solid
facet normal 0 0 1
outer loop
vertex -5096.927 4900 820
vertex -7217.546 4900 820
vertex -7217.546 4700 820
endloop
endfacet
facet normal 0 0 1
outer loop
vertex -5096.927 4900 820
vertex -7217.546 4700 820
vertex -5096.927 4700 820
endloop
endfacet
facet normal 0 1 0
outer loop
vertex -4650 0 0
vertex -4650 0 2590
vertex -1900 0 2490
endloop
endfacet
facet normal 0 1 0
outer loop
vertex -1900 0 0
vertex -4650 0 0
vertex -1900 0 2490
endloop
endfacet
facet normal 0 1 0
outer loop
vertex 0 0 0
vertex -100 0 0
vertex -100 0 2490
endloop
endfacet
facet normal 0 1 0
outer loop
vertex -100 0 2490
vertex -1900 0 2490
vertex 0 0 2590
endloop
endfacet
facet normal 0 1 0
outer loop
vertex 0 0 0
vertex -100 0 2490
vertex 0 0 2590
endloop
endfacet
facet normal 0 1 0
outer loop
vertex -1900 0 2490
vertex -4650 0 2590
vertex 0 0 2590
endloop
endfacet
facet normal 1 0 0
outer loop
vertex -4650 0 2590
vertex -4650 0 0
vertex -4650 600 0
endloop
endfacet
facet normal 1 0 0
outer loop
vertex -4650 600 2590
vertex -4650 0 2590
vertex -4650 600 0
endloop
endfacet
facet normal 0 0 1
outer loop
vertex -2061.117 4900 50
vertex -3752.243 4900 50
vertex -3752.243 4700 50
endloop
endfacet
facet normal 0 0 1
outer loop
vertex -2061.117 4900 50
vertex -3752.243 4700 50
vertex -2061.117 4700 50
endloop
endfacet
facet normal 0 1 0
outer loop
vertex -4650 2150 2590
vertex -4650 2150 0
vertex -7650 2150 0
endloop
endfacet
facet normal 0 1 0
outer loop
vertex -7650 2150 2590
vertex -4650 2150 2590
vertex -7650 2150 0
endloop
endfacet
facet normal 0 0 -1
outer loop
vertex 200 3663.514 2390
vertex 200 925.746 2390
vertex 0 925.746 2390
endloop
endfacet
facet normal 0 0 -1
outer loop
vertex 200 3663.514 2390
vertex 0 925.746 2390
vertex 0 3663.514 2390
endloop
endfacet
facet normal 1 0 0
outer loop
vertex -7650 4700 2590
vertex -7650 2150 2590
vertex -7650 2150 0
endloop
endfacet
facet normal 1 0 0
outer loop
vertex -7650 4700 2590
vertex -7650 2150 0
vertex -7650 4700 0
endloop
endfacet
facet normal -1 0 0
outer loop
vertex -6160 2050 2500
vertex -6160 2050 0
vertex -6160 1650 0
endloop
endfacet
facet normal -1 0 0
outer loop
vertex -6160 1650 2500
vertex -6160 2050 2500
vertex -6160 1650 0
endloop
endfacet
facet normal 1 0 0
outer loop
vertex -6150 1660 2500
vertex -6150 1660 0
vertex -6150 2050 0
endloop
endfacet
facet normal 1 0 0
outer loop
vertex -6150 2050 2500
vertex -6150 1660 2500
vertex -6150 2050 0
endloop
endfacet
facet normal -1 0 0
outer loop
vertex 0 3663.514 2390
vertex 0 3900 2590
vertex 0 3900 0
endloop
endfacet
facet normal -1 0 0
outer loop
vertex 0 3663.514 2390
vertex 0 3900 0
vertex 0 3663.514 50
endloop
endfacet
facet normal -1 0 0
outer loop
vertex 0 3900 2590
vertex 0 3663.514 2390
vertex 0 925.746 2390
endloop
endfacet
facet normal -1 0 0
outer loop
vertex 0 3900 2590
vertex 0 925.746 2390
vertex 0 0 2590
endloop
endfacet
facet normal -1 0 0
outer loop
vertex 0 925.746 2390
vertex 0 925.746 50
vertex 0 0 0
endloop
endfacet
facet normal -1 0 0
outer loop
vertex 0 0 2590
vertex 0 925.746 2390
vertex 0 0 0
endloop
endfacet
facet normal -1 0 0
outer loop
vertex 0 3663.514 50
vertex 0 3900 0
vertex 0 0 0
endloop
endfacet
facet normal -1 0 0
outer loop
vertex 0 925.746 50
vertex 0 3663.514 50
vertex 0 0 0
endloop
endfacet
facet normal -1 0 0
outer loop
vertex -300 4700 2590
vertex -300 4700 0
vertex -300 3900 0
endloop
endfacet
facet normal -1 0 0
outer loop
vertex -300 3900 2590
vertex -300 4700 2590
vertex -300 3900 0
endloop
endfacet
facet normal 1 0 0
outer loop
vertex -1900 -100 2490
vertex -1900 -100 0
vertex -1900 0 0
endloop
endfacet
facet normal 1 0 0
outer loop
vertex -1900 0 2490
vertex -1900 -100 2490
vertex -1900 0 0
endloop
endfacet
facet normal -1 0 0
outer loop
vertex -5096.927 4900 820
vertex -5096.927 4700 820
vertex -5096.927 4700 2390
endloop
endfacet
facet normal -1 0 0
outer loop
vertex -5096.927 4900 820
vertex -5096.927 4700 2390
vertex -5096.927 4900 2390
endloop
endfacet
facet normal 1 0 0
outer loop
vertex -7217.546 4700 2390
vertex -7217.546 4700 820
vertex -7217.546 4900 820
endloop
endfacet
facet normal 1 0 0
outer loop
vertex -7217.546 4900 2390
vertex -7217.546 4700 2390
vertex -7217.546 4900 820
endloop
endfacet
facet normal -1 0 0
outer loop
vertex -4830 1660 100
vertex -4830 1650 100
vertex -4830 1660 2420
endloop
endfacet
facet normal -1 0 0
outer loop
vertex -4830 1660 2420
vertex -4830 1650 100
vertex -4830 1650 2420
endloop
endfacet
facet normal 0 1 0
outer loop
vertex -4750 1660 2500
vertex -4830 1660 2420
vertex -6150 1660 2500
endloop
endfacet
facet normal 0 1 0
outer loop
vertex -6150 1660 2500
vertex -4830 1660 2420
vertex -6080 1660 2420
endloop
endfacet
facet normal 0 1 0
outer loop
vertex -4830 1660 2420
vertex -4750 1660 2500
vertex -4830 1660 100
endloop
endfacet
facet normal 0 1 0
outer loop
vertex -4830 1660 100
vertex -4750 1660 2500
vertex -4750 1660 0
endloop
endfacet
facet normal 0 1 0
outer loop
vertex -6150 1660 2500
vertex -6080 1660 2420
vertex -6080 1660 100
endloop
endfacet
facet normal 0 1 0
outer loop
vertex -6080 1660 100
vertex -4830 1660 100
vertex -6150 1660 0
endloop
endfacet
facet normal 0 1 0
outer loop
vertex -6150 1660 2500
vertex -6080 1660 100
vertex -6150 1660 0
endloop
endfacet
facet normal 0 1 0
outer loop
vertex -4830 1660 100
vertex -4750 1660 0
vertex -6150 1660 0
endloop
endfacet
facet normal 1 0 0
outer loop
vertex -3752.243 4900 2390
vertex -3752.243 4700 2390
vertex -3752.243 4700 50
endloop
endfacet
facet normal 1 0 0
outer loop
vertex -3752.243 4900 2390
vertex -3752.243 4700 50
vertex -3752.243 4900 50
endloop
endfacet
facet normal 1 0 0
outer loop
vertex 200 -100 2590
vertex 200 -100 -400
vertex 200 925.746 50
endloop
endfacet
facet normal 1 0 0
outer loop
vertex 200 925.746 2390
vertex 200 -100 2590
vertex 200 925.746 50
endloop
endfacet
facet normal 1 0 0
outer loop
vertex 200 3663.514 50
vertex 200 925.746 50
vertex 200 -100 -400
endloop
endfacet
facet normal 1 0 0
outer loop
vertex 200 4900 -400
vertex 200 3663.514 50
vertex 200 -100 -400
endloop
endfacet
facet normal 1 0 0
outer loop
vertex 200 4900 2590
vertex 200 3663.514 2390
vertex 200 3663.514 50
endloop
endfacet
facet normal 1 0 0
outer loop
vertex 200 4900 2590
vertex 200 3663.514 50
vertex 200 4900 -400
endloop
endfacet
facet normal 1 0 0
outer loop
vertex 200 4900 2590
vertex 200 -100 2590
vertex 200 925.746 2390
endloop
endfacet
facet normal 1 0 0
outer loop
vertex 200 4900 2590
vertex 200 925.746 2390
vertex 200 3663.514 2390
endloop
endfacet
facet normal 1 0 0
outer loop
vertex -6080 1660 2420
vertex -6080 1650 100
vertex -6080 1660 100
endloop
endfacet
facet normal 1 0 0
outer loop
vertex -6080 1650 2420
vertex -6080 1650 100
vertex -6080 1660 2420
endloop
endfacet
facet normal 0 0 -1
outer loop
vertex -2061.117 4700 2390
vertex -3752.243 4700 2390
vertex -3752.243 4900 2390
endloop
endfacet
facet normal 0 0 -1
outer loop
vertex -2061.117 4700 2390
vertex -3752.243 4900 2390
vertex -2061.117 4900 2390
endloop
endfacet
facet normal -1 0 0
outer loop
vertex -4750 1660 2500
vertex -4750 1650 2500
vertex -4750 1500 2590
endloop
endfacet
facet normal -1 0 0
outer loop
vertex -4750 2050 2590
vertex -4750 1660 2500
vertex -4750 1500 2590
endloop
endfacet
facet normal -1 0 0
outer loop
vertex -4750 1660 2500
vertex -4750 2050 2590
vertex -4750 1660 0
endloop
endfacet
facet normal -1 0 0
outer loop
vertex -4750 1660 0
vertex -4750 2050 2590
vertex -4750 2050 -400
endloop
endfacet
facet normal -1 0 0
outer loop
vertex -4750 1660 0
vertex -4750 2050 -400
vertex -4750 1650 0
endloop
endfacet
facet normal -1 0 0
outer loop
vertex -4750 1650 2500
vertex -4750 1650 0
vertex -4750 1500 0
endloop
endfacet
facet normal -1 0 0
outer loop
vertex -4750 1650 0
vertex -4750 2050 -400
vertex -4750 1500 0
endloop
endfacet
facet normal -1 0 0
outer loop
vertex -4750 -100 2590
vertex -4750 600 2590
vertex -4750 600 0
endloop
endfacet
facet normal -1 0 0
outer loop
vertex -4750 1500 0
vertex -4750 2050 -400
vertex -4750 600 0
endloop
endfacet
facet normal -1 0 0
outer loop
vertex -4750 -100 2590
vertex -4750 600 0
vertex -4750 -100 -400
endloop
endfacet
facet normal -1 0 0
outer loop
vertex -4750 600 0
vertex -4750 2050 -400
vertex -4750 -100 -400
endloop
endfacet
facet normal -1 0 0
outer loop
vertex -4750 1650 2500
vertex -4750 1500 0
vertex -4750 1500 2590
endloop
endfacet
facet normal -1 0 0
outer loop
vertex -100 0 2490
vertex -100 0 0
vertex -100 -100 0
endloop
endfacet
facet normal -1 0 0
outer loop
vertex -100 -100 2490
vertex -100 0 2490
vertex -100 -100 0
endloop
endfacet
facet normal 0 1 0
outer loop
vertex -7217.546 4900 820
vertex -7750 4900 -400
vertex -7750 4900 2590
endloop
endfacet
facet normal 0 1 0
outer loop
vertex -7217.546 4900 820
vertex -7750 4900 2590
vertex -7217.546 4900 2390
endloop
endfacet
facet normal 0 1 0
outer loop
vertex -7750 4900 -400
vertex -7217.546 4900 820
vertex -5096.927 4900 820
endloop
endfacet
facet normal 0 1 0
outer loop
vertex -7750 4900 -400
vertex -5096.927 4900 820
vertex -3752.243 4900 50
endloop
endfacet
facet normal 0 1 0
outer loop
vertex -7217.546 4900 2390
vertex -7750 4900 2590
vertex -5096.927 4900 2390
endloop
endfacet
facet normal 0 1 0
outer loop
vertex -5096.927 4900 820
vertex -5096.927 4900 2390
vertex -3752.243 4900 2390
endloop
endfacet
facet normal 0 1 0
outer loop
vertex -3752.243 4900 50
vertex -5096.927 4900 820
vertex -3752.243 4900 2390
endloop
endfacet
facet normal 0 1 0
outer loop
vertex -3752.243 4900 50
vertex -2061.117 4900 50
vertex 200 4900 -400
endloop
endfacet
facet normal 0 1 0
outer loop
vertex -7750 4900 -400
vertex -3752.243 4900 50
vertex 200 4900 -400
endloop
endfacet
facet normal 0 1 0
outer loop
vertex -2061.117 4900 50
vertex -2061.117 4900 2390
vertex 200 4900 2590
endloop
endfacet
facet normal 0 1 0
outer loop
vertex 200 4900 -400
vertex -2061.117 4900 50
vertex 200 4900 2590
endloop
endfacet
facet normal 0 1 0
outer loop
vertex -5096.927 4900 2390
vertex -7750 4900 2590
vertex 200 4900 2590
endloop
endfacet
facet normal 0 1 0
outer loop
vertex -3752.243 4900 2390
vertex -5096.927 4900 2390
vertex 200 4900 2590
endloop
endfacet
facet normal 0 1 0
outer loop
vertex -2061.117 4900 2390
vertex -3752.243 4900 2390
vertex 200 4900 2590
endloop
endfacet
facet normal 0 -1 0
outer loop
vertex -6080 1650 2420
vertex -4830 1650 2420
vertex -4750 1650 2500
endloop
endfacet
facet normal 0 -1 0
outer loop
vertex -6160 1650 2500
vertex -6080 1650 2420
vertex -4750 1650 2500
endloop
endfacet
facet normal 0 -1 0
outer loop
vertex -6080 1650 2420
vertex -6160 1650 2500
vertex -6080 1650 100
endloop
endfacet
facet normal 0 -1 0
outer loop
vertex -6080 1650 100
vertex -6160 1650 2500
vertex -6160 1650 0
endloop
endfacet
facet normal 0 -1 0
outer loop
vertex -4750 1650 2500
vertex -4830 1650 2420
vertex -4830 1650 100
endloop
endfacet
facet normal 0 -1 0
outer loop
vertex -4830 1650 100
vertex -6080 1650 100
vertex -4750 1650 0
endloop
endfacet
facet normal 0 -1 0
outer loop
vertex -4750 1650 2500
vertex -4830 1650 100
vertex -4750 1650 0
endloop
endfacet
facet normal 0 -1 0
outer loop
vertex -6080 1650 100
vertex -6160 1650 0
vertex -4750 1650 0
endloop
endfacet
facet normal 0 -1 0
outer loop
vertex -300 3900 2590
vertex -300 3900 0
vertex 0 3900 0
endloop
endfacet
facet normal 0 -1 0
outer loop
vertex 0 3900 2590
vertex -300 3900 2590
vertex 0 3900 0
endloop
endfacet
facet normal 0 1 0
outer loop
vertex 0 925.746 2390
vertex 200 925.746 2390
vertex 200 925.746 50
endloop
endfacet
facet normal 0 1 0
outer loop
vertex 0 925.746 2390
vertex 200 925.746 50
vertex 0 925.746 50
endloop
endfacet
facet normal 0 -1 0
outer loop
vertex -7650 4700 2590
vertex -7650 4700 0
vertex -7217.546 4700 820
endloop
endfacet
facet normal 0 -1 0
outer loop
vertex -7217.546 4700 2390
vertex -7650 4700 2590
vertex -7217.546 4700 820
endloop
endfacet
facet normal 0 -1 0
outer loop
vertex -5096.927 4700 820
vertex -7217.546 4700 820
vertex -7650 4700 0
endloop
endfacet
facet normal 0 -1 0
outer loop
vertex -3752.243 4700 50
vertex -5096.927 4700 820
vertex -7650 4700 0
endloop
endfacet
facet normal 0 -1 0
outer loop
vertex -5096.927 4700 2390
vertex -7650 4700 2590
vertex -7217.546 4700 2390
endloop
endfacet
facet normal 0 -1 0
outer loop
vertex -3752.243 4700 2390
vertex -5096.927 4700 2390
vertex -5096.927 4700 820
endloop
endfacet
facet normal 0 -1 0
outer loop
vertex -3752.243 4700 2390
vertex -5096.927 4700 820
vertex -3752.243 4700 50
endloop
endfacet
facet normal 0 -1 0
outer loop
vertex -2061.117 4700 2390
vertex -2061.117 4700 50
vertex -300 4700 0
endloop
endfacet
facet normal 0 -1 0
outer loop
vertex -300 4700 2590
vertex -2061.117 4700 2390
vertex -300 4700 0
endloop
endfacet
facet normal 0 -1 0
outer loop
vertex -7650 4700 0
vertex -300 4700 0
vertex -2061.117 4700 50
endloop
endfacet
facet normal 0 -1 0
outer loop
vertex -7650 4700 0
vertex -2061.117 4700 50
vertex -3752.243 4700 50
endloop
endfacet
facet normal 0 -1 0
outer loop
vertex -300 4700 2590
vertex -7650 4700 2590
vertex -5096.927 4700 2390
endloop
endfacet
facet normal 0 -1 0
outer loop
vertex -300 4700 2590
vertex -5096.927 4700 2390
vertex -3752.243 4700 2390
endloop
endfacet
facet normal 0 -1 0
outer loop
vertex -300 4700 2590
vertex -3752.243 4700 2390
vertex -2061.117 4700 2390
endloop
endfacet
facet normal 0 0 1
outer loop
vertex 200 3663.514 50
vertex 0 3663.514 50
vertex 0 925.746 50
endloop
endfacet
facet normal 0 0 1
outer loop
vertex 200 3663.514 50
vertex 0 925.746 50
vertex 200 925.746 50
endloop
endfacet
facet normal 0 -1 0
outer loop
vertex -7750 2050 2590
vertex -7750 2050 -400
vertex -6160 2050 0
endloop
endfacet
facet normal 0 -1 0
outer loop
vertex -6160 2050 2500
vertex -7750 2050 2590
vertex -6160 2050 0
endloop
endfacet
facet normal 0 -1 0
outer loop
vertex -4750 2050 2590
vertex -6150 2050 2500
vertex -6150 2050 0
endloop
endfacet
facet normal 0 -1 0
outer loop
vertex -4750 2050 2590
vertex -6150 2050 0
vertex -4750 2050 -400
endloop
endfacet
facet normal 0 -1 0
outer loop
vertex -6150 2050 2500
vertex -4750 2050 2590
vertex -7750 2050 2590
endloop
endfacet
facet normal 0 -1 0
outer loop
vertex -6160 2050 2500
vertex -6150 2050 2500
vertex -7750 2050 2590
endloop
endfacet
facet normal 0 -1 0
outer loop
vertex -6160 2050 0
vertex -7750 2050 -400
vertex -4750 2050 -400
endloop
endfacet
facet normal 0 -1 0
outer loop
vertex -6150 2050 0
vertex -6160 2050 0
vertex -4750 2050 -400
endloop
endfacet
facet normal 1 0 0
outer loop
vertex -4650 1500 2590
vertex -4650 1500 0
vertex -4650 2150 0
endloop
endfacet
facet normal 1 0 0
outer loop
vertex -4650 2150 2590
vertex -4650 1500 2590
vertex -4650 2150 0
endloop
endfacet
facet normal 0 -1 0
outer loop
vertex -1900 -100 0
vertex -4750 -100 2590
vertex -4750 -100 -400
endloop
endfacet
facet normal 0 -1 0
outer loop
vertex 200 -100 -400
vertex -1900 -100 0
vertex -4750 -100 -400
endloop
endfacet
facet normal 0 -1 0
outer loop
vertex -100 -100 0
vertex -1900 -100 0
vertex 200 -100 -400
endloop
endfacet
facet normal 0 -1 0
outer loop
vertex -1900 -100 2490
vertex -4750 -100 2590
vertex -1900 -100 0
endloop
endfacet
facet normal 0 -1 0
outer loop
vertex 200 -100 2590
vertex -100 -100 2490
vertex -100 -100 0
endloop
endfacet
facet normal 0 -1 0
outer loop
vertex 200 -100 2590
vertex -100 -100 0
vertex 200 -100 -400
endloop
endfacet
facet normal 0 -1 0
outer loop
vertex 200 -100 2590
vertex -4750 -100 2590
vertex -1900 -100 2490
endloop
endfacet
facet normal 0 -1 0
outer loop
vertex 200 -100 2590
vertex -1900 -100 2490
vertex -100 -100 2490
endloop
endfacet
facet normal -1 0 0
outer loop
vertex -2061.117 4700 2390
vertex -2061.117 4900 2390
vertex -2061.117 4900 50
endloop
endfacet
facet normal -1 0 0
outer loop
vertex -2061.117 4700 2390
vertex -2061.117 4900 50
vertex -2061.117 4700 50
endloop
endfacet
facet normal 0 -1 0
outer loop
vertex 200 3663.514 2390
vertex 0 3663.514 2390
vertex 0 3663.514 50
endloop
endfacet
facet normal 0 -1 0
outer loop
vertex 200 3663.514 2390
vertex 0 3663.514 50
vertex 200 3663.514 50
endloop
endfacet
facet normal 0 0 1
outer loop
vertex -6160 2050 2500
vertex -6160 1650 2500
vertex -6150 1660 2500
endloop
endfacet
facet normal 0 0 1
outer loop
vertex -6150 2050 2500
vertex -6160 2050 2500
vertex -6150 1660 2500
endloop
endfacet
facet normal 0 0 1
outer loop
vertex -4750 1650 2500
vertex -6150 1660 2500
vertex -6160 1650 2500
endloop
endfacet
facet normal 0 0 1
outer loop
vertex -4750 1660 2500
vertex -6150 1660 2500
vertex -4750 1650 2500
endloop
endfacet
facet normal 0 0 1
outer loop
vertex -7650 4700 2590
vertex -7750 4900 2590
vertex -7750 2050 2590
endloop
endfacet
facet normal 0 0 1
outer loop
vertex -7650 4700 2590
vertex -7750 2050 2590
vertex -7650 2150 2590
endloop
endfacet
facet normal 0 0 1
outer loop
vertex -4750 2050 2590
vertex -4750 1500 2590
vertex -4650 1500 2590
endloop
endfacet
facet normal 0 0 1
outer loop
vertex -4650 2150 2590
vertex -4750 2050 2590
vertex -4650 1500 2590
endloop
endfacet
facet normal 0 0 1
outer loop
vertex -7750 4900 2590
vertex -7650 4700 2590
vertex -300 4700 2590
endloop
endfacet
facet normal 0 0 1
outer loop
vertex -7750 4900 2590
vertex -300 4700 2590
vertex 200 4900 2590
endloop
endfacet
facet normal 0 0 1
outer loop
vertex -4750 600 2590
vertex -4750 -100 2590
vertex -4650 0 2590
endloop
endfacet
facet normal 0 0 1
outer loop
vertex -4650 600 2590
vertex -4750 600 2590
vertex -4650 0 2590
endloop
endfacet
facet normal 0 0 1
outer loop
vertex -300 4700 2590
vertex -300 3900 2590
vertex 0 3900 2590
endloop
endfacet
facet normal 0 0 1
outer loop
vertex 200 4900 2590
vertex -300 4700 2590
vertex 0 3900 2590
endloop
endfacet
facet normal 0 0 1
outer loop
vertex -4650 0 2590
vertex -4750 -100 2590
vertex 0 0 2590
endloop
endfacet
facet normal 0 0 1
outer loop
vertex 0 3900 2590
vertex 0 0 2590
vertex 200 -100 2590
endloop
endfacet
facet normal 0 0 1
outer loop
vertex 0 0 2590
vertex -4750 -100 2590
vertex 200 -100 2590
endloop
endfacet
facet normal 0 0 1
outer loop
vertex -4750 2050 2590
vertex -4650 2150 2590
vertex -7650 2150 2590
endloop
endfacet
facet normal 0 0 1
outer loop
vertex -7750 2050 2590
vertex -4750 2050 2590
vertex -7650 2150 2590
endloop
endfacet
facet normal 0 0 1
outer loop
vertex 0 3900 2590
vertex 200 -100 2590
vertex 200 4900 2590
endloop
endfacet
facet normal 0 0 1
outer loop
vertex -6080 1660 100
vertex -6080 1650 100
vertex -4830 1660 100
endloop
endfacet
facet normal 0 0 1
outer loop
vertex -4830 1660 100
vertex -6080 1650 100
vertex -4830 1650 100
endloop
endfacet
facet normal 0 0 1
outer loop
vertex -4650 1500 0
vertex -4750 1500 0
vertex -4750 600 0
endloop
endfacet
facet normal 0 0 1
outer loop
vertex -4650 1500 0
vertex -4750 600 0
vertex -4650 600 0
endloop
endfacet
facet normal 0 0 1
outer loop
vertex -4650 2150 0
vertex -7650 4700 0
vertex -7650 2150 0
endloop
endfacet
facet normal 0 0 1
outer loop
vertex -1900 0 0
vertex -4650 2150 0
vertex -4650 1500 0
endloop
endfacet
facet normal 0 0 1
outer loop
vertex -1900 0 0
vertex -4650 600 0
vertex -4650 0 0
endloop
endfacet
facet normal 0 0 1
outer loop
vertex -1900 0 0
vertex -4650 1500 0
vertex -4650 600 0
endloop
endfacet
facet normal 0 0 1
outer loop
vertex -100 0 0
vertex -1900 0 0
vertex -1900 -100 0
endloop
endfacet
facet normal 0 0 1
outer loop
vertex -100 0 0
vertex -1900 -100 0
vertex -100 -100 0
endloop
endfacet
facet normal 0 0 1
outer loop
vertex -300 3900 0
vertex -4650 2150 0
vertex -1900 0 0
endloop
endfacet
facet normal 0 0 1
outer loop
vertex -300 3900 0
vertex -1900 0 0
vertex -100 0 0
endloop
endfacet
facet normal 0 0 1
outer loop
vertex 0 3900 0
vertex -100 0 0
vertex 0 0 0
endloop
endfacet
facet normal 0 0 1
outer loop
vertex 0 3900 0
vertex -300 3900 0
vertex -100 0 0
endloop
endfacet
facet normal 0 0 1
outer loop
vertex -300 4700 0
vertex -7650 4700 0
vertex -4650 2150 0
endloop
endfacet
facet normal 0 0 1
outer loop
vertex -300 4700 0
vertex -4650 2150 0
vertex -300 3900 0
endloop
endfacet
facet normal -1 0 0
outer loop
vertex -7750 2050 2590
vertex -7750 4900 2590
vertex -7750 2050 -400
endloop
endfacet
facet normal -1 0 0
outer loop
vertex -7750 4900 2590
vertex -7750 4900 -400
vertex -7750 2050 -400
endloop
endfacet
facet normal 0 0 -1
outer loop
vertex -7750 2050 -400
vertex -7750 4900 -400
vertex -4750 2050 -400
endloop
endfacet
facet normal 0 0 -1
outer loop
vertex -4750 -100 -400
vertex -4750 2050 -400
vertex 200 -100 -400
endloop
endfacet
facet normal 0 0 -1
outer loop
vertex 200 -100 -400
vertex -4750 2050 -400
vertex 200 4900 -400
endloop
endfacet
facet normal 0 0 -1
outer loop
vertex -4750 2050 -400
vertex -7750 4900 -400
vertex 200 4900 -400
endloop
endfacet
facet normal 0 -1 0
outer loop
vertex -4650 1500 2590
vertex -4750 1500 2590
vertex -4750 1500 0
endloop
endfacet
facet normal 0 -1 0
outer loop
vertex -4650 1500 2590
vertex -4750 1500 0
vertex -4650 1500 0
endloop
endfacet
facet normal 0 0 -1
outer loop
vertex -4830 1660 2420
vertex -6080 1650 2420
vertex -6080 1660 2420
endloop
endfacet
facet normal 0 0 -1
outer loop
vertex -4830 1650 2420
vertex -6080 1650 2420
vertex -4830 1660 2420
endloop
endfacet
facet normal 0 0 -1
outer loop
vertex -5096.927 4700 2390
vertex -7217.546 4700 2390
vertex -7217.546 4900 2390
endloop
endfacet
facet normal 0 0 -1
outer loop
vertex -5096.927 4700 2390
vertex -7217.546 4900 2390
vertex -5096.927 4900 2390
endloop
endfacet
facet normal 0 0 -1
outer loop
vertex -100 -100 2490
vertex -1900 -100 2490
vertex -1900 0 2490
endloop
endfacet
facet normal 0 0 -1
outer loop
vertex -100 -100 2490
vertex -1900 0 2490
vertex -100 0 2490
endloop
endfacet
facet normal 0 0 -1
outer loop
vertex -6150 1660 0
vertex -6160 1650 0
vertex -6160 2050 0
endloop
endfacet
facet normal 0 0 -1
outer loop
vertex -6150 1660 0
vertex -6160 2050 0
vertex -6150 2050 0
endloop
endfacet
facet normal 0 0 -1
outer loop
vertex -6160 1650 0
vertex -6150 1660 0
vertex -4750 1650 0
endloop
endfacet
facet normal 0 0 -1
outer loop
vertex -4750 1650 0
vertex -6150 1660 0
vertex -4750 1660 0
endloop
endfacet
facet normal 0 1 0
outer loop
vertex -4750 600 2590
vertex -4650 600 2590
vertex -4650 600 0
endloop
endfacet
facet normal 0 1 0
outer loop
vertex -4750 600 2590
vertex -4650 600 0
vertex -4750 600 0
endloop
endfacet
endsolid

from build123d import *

# Parameters (mm, degrees)
F0_W      = 100
F0_H      = 900
F0_W_2    = 1691.1261081696
F0_H_2    = 200
F0_W_3    = 2120.6188201904
F0_W_4    = 1344.6843624115
F0_W_5    = 200
F0_H_3    = 2737.768471241
F0_W_6    = 1800
F0_H_4    = 100
F1_DEPTH  = 400
F2_DEPTH  = 2590
F3_DEPTH  = 50
F4_DEPTH  = 820
F5_DEPTH  = 2500
F6_W      = 1250
F6_H      = 2320
F7_DEPTH  = 25
F8_W      = 2120.6188201904
F8_H      = 200
F8_W_2    = 1691.1261081696
F9_DEPTH  = 200
F10_W     = 1800
F10_H     = 100
F11_DEPTH = 100
F12_W     = 2737.768471241
F12_H     = 200
F13_DEPTH = 200


with BuildPart() as f1:
    # F0 (on Top) → F1 (new body)
    with BuildSketch(Plane.XY):
        Polygon((-4750, 1500), (-4650, 1500), (-4650, 2150), (-7650, 2150), (-7650, 4700), (-7217.5459861755, 4700), (-7217.5459861755, 4900), (-7750, 4900), (-7750, 2050), (-6160, 2050), (-6150, 2050), (-4750, 2050), (-4750, 1660), (-4750, 1650), align=None)
        Polygon((-100, 0), (0, 0), (0, 925.7456660271), (0, 3663.5141372681), (0, 3900), (-300, 3900), (-300, 4700), (-2061.1166954041, 4700), (-3752.2428035736, 4700), (-5096.9271659851, 4700), (-7217.5459861755, 4700), (-7650, 4700), (-7650, 2150), (-4650, 2150), (-4650, 1500), (-4650, 600), (-4650, 0), (-1900, 0), align=None)
        with Locations((-4700, 1050)):
            Rectangle(F0_W, F0_H)
        Polygon((-1900, -100), (-1900, 0), (-4650, 0), (-4650, 600), (-4750, 600), (-4750, -100), align=None)
        with Locations((-2906.6797494888, 4800)):
            Rectangle(F0_W_2, F0_H_2)
        Polygon((0, 3900), (0, 3663.5141372681), (200, 3663.5141372681), (200, 4900), (-2061.1166954041, 4900), (-2061.1166954041, 4700), (-300, 4700), (-300, 3900), align=None)
        with Locations((-6157.2365760803, 4800)):
            Rectangle(F0_W_3, F0_H_2)
        with Locations((-4424.5849847794, 4800)):
            Rectangle(F0_W_4, F0_H_2)
        with Locations((100, 2294.6299016476)):
            Rectangle(F0_W_5, F0_H_3)
        Polygon((0, 925.7456660271), (0, 0), (-100, 0), (-100, -100), (200, -100), (200, 925.7456660271), align=None)
        with Locations((-1000, -50)):
            Rectangle(F0_W_6, F0_H_4)
    extrude(amount=-F1_DEPTH)

    # F0 (on Top) → F2 (join)
    with BuildSketch(Plane.XY):
        Polygon((-4750, 1500), (-4650, 1500), (-4650, 2150), (-7650, 2150), (-7650, 4700), (-7217.5459861755, 4700), (-7217.5459861755, 4900), (-7750, 4900), (-7750, 2050), (-6160, 2050), (-6150, 2050), (-4750, 2050), (-4750, 1660), (-4750, 1650), align=None)
        with Locations((-4424.5849847794, 4800)):
            Rectangle(F0_W_4, F0_H_2)
        Polygon((0, 3900), (0, 3663.5141372681), (200, 3663.5141372681), (200, 4900), (-2061.1166954041, 4900), (-2061.1166954041, 4700), (-300, 4700), (-300, 3900), align=None)
        Polygon((0, 925.7456660271), (0, 0), (-100, 0), (-100, -100), (200, -100), (200, 925.7456660271), align=None)
        Polygon((-1900, -100), (-1900, 0), (-4650, 0), (-4650, 600), (-4750, 600), (-4750, -100), align=None)
    extrude(amount=F2_DEPTH)

    # F0 (on Top) → F3 (join)
    with BuildSketch(Plane.XY):
        with Locations((-2906.6797494888, 4800)):
            Rectangle(F0_W_2, F0_H_2)
        with Locations((100, 2294.6299016476)):
            Rectangle(F0_W_5, F0_H_3)
    extrude(amount=F3_DEPTH)

    # F0 (on Top) → F4 (join)
    with BuildSketch(Plane.XY):
        with Locations((-6157.2365760803, 4800)):
            Rectangle(F0_W_3, F0_H_2)
    extrude(amount=F4_DEPTH)

    # F0 (on Top) → F5 (join)
    with BuildSketch(Plane.XY):
        Polygon((-6160, 1650), (-4750, 1650), (-4750, 1660), (-6150, 1660), (-6150, 2050), (-6160, 2050), align=None)
    extrude(amount=F5_DEPTH)

    # F6 (on face) → F7 (cut)
    with BuildSketch(Plane.XZ.offset(-1650)):
        with Locations((-5455, 1260)):
            Rectangle(F6_W, F6_H)
    extrude(amount=-F7_DEPTH, mode=Mode.SUBTRACT)

    # F8 (on face) → F9 (join)
    with BuildSketch(Plane.XZ.offset(-4700)):
        with Locations((-6157.2365760803, 2490)):
            Rectangle(F8_W, F8_H)
        with Locations((-2906.6797494888, 2490)):
            Rectangle(F8_W_2, F8_H)
    extrude(amount=-F9_DEPTH)

    # F10 (on face) → F11 (join)
    with BuildSketch(Plane.XZ.offset(100)):
        with Locations((-1000, 2540)):
            Rectangle(F10_W, F10_H)
    extrude(amount=-F11_DEPTH)

    # F12 (on face) → F13 (join)
    with BuildSketch(Plane.YZ.offset(200)):
        Polygon((-100, -400), (4900, -400), (4900, 2590), (3663.5141372681, 2590), (3663.5141372681, 2390), (3663.5141372681, 50), (925.7456660271, 50), (925.7456660271, 2390), (925.7456660271, 2590), (-100, 2590), align=None)
        with Locations((2294.6299016476, 2490)):
            Rectangle(F12_W, F12_H)
    extrude(amount=-F13_DEPTH)


solid = f1.part
